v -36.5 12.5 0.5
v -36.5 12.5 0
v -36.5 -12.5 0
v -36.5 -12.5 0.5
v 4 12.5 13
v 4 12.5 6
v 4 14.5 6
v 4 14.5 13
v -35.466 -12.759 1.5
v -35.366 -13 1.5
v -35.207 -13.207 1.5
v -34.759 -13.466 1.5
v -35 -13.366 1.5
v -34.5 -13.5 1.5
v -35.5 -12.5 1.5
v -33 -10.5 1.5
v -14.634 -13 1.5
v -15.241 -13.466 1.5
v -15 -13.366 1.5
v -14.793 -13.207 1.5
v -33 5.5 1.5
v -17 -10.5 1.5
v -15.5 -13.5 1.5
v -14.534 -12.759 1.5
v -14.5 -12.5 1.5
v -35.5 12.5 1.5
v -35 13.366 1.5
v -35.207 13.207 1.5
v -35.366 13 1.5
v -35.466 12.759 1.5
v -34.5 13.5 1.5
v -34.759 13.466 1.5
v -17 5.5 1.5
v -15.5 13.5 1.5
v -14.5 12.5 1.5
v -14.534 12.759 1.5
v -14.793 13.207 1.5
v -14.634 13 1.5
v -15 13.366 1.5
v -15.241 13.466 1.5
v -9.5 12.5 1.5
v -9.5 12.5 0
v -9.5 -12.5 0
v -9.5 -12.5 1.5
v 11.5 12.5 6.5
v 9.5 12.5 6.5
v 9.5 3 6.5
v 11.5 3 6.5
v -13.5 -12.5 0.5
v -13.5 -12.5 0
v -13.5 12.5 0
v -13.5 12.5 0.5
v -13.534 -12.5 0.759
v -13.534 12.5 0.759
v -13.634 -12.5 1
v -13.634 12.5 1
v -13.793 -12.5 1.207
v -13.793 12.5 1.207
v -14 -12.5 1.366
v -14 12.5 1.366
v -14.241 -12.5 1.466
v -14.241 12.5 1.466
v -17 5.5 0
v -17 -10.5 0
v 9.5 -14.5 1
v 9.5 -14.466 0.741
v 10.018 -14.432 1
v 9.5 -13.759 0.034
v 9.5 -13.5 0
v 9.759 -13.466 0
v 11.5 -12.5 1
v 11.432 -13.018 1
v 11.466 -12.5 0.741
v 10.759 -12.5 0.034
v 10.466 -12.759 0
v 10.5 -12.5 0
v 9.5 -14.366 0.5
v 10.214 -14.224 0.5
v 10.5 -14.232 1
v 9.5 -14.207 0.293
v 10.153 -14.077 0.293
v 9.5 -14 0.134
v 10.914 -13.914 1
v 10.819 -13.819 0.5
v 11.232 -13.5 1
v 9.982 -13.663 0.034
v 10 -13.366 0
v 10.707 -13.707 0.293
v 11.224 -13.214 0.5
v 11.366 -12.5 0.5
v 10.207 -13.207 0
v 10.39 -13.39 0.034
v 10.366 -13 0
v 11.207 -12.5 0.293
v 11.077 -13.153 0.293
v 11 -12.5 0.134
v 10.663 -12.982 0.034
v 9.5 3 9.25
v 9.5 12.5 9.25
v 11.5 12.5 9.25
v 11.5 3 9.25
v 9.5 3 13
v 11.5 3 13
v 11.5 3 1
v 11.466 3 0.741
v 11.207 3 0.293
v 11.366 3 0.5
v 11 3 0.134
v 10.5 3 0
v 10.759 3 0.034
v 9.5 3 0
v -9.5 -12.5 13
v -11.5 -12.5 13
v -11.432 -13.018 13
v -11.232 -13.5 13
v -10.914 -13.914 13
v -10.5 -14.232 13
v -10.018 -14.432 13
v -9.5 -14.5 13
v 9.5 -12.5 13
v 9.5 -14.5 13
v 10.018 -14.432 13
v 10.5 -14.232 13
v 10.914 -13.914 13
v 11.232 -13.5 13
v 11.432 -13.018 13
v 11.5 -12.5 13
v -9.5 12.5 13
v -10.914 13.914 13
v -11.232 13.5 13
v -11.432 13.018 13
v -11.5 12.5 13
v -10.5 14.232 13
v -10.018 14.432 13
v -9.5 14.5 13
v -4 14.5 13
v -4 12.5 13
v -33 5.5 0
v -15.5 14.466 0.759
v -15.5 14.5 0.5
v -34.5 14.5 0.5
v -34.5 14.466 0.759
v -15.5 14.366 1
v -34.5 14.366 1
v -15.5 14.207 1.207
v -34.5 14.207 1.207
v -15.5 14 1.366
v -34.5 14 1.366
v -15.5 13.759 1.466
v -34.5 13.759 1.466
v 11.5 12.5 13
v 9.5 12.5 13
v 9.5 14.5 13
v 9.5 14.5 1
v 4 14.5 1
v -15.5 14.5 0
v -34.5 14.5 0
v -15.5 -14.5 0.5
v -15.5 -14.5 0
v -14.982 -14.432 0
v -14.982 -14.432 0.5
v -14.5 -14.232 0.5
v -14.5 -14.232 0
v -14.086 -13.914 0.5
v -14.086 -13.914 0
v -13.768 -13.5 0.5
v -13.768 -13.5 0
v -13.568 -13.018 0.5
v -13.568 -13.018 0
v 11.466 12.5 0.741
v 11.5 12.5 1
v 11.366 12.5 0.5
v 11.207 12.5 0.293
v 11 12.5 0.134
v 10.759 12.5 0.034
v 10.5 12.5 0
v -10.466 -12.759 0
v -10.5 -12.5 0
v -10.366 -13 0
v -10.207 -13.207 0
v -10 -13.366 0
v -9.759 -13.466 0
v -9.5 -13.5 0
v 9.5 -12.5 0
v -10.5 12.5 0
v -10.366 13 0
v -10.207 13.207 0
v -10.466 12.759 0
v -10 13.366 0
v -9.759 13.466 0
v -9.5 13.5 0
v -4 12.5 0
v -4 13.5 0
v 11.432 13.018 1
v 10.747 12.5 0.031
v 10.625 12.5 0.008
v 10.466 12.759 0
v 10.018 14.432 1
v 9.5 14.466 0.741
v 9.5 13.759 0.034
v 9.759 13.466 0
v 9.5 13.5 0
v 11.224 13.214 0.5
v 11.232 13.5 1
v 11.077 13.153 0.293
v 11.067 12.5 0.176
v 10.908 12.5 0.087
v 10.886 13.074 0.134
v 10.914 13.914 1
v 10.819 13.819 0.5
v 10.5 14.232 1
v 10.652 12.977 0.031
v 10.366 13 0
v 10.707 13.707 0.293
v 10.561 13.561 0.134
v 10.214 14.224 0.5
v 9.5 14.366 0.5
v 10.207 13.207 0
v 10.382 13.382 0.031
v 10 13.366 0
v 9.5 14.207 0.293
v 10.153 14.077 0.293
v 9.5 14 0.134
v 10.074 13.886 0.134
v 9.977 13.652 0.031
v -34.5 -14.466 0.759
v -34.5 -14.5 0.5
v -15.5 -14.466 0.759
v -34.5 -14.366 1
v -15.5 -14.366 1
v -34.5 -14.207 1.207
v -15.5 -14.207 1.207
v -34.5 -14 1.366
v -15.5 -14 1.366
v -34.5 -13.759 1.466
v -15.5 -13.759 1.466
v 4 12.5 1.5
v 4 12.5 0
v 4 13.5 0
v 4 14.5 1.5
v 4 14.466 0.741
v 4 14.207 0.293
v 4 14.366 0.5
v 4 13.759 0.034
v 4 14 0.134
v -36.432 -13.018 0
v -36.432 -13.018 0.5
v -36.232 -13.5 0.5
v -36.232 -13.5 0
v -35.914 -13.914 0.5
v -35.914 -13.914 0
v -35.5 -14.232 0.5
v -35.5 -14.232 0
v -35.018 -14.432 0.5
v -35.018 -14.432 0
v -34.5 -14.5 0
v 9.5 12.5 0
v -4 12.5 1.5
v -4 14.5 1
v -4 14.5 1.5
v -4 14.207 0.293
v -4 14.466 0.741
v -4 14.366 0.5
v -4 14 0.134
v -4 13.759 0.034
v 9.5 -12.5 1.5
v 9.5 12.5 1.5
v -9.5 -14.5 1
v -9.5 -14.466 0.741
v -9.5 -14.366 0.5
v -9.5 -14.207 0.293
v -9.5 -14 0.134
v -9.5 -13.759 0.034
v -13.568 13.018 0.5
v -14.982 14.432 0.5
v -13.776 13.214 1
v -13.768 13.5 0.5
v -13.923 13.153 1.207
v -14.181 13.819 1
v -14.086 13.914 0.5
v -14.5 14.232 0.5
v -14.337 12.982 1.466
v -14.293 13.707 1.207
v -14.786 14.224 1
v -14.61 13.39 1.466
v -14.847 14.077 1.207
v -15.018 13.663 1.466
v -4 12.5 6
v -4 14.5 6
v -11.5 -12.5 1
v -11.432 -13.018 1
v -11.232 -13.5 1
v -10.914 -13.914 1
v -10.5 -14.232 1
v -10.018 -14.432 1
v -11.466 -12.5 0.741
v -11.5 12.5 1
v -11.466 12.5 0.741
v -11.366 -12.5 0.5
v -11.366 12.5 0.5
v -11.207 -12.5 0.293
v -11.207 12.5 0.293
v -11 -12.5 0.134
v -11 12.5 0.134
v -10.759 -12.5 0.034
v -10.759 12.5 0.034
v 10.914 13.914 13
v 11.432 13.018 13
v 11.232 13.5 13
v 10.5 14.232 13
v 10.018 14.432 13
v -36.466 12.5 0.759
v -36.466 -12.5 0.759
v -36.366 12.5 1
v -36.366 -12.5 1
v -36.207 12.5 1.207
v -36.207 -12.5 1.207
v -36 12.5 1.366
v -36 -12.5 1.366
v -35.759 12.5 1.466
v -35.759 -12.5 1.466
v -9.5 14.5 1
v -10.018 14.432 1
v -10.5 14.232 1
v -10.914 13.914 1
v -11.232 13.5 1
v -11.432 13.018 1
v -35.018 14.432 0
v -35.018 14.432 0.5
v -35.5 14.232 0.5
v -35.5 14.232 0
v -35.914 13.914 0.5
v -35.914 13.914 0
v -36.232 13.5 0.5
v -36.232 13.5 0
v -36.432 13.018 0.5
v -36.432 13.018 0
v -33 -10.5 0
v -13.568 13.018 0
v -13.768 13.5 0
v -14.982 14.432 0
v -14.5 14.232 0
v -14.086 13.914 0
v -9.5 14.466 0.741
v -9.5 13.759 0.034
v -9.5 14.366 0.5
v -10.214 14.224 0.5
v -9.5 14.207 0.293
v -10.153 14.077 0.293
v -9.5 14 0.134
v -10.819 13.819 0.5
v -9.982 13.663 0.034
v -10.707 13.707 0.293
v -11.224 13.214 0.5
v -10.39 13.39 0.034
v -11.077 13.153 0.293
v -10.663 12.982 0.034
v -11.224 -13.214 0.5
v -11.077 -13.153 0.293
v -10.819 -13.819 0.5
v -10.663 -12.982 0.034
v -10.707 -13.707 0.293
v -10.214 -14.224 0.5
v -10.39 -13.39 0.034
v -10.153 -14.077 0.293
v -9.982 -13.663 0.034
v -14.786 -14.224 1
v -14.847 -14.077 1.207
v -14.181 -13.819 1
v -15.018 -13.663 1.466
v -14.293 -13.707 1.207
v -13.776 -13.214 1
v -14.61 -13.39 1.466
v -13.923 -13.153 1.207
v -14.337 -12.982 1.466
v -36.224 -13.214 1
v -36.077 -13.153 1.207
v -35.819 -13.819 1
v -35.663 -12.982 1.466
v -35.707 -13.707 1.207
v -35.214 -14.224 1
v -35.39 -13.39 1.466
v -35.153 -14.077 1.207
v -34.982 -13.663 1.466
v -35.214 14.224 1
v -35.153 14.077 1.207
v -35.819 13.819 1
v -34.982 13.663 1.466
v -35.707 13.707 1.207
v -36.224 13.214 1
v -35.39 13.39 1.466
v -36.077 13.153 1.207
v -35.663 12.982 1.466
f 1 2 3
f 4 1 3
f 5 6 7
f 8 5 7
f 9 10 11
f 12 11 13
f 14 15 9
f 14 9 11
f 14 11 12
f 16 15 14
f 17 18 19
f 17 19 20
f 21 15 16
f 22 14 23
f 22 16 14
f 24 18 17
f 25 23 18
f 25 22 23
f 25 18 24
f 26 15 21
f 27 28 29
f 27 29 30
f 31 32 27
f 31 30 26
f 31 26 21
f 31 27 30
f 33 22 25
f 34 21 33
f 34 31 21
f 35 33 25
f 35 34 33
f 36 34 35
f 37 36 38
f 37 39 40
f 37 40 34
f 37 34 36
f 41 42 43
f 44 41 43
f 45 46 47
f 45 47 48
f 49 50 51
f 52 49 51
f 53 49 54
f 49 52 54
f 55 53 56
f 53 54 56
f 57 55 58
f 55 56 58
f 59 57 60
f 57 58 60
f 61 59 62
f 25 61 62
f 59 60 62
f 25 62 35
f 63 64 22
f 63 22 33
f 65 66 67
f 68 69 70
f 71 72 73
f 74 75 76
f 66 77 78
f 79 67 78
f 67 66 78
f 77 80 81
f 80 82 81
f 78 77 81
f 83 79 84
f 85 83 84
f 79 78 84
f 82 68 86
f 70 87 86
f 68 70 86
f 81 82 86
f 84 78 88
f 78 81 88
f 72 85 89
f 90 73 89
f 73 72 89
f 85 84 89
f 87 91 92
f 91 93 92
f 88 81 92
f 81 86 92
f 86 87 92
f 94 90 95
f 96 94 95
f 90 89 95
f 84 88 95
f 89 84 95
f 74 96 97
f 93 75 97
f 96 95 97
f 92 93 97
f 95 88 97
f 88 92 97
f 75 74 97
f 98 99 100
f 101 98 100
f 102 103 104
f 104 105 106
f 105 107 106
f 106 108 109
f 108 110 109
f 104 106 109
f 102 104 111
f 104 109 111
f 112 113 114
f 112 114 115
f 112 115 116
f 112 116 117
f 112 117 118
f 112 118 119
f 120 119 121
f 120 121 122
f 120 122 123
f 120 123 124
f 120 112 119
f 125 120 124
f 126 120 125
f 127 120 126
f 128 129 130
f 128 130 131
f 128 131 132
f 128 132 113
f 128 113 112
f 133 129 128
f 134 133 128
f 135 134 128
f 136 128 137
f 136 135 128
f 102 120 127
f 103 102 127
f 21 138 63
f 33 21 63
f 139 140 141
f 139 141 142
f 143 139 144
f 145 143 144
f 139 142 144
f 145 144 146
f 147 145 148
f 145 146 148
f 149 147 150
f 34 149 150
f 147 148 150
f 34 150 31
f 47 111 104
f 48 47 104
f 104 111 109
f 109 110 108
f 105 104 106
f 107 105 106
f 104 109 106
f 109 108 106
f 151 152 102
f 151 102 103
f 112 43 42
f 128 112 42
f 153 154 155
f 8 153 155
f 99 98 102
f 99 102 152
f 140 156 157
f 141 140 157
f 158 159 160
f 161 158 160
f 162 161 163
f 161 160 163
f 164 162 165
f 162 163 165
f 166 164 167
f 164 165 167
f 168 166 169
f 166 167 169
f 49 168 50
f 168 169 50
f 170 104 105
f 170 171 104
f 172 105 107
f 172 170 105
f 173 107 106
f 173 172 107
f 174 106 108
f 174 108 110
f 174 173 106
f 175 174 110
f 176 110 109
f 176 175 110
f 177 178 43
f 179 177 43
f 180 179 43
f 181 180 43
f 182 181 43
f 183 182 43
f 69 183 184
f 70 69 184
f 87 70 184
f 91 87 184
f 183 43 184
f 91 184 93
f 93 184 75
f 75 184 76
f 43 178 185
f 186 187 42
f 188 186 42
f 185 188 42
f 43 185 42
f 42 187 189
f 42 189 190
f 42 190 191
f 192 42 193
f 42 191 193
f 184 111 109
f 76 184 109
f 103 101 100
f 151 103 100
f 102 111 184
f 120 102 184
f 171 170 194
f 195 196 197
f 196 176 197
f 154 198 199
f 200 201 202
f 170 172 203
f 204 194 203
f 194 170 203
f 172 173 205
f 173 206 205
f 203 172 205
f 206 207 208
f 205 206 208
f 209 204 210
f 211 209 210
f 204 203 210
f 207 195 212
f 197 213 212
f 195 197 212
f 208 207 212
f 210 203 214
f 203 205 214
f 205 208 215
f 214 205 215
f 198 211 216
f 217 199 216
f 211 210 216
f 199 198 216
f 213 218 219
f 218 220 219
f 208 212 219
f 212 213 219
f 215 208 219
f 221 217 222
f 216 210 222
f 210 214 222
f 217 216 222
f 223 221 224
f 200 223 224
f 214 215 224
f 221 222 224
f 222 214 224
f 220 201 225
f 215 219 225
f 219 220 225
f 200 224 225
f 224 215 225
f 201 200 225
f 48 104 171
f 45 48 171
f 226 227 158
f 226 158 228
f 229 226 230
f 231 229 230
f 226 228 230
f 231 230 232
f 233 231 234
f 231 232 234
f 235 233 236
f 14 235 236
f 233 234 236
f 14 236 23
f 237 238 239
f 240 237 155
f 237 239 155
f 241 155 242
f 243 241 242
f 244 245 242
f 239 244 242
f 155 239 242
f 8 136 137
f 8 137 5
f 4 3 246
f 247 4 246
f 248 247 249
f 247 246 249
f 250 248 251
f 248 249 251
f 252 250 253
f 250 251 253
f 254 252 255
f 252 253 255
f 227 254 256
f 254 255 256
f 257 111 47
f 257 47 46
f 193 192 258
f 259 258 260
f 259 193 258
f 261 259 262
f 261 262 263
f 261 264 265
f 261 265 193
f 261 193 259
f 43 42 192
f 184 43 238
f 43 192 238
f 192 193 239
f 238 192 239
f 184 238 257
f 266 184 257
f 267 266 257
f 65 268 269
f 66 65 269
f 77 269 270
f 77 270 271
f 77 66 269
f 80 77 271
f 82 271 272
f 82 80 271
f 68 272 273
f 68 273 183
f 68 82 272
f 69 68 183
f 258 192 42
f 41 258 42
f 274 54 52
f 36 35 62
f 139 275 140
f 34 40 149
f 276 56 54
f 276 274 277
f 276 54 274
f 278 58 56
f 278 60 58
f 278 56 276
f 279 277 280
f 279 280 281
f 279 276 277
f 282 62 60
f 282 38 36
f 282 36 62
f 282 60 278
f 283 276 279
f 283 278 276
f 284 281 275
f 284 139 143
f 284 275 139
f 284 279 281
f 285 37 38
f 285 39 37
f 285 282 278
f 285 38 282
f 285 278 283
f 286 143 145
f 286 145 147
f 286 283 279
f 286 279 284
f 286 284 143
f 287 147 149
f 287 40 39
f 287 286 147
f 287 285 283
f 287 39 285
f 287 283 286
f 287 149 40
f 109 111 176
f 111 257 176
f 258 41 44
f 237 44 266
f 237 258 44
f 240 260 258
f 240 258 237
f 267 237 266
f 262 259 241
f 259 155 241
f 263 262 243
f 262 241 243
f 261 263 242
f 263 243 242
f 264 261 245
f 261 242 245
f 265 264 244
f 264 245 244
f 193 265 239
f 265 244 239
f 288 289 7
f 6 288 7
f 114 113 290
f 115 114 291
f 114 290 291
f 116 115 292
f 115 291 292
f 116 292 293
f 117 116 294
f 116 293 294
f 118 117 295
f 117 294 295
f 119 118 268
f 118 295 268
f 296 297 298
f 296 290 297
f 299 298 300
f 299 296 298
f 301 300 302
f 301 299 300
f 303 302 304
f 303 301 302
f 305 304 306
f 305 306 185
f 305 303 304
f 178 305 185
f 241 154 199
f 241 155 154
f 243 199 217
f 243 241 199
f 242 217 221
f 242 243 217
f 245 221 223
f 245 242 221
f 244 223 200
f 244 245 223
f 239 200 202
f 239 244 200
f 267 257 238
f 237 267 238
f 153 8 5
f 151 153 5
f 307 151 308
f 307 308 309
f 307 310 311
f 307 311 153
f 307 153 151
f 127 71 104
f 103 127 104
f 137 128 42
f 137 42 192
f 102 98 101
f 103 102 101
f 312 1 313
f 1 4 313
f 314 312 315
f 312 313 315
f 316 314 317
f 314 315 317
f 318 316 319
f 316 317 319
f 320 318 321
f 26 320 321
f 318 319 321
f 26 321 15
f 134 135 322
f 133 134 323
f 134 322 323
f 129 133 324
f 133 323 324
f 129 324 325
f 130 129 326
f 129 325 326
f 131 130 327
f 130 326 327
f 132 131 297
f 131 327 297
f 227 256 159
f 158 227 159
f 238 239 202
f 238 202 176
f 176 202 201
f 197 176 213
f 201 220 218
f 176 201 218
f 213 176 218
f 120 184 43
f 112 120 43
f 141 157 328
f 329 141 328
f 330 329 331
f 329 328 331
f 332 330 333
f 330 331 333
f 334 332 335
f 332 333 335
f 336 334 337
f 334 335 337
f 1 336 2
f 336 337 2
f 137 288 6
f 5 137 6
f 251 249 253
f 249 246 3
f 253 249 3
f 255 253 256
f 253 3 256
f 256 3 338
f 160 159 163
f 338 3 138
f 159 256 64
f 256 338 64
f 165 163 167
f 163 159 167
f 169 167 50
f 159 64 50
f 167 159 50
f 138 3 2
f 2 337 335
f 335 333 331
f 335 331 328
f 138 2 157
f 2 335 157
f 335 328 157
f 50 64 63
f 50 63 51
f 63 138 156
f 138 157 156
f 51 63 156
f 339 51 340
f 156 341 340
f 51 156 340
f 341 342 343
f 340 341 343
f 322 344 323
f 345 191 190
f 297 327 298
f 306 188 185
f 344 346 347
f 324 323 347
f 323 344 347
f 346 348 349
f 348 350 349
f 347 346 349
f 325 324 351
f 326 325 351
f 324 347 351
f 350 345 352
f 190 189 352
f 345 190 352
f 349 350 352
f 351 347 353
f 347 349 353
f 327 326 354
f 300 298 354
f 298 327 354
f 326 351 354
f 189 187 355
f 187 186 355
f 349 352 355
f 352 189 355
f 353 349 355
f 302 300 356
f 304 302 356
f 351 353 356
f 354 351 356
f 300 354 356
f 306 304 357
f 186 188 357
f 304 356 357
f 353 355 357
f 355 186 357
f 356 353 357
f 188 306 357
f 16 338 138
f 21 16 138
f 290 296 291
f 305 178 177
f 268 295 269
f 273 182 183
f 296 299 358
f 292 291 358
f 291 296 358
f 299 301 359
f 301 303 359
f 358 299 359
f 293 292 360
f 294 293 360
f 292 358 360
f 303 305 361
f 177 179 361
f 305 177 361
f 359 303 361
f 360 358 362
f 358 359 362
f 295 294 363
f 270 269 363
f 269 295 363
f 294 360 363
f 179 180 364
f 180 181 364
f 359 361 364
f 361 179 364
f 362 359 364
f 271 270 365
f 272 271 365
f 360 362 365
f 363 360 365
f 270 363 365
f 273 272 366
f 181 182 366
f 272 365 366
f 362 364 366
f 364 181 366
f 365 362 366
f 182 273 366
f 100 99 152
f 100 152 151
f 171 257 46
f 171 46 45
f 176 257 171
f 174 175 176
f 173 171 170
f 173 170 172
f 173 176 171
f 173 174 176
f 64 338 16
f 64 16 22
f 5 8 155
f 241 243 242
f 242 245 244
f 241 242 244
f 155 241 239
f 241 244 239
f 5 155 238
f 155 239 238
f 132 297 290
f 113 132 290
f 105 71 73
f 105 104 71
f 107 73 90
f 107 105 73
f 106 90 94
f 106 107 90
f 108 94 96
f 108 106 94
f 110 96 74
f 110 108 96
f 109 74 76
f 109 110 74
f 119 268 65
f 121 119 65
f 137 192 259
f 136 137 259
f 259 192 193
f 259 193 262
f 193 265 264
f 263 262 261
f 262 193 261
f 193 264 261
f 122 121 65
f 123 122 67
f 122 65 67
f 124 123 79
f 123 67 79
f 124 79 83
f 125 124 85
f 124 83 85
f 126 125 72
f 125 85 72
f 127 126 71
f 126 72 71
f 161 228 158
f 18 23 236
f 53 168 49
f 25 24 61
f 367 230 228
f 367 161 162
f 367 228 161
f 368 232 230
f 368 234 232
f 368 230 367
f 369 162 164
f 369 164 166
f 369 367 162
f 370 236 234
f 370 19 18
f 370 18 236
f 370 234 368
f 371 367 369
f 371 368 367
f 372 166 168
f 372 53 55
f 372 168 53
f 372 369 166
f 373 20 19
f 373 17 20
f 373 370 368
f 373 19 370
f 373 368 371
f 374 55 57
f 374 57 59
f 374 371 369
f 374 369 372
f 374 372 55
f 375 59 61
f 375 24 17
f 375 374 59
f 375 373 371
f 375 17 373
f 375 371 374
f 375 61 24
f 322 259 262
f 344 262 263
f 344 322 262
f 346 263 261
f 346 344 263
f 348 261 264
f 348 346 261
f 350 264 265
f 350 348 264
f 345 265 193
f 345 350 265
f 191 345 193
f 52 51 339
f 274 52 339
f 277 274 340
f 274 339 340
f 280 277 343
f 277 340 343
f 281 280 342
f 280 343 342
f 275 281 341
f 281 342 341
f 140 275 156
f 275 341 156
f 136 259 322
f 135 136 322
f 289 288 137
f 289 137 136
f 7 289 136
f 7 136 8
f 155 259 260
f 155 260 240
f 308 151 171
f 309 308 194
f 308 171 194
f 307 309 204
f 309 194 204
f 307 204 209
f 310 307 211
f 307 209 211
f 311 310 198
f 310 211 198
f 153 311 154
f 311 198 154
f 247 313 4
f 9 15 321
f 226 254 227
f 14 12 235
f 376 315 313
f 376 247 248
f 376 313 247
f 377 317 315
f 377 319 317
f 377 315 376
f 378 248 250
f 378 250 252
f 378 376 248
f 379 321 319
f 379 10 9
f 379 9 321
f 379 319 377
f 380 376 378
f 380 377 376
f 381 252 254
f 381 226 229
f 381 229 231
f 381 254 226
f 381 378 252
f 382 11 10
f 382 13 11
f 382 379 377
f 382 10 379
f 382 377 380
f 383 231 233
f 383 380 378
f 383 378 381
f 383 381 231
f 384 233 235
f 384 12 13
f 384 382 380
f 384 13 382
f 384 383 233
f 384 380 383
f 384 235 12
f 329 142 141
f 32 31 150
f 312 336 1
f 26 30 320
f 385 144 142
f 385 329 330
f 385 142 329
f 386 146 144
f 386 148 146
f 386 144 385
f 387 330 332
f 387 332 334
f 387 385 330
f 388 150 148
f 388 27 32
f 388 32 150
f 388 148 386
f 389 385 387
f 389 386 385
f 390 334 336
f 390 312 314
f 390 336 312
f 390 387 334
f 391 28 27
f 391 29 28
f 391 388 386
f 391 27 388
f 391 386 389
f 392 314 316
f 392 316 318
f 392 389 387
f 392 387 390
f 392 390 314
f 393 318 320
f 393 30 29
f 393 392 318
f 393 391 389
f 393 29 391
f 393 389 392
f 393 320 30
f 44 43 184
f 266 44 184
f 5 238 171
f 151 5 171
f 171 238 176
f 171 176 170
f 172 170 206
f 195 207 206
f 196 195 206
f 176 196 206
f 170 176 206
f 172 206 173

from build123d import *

# Parameters (mm, degrees)
F0_W      = 2
F0_H      = 9.5
F0_W_2    = 15
F0_H_2    = 2
F2_DEPTH  = 13
F3_W      = 8
F3_H      = 2
F4_DEPTH  = 1.5
F5_W      = 2
F5_H      = 9.5
F6_DEPTH  = 6.5
F8_START  = 6
F7_W      = 8
F7_H      = 2
F8_DEPTH  = 7
F10_START = 9.25
F9_W      = 2
F9_H      = 9.5
F10_DEPTH = 3.75
F11_R     = 1
F11_2_R   = 1
F11_3_R   = 1
F11_4_R   = 1
F1_W      = 8
F1_H      = 2
F1_W_2    = 2
F1_H_2    = 9.5
F1_W_3    = 15
F1_W_4    = 16
F1_H_3    = 16
F12_DEPTH = 1.5
F13_R     = 1


with BuildPart() as f2:
    # F0 (on Top) → F2 (new body)
    with BuildSketch(Plane.XY):
        with BuildLine():
            Line((-9.5, 12.5), (-4, 12.5))
            Line((-4, 12.5), (-4, 14.5))
            Line((-4, 14.5), (-9.5, 14.5))
            ThreePointArc((-9.5, 14.5), (-10.9142135624, 13.9142135624), (-11.5, 12.5))
            Line((-11.5, 12.5), (-9.5, 12.5))
        make_face()
        with Locations((-10.5, 7.75)):
            Rectangle(F0_W, F0_H)
        with BuildLine():
            Line((-7.5, -14.5), (-7.5, -12.5))
            Line((-7.5, -12.5), (-9.5, -12.5))
            Line((-9.5, -12.5), (-9.5, 3))
            Line((-9.5, 3), (-11.5, 3))
            Line((-11.5, 3), (-11.5, -12.5))
            ThreePointArc((-11.5, -12.5), (-10.9142135624, -13.9142135624), (-9.5, -14.5))
            Line((-9.5, -14.5), (-7.5, -14.5))
        make_face()
        with Locations((0, -13.5)):
            Rectangle(F0_W_2, F0_H_2)
        with BuildLine():
            Line((9.5, 3), (9.5, -12.5))
            Line((9.5, -12.5), (7.5, -12.5))
            Line((7.5, -12.5), (7.5, -14.5))
            Line((7.5, -14.5), (9.5, -14.5))
            ThreePointArc((9.5, -14.5), (10.9142135624, -13.9142135624), (11.5, -12.5))
            Line((11.5, -12.5), (11.5, 3))
            Line((11.5, 3), (9.5, 3))
        make_face()
    extrude(amount=F2_DEPTH)

    # F11
    f11_edges = [f2.edges().sort_by_distance(p)[0] for p in [
        (0, -14.5, 0),
    ]]
    fillet(f11_edges, radius=F11_R)


with BuildPart() as f2b:
    # F0 (on Top) → F2, piece 2 (new body)
    with BuildSketch(Plane.XY):
        with BuildLine():
            Line((4, 12.5), (9.5, 12.5))
            Line((9.5, 12.5), (11.5, 12.5))
            ThreePointArc((11.5, 12.5), (10.9142135624, 13.9142135624), (9.5, 14.5))
            Line((9.5, 14.5), (4, 14.5))
            Line((4, 14.5), (4, 12.5))
        make_face()
    extrude(amount=F2_DEPTH)

    # F11#2
    f11_2_edges = [f2b.edges().sort_by_distance(p)[0] for p in [
        (6.75, 14.5, 0),
    ]]
    fillet(f11_2_edges, radius=F11_2_R)


with BuildPart() as f4:
    # F3 (on Top) → F4 (new body)
    with BuildSketch(Plane.XY):
        Polygon((7.5, -12.5), (9.5, -12.5), (9.5, 12.5), (4, 12.5), (-4, 12.5), (-9.5, 12.5), (-9.5, 3), (-9.5, -12.5), (-7.5, -12.5), align=None)
        with Locations((0, 13.5)):
            Rectangle(F3_W, F3_H)
    extrude(amount=F4_DEPTH)

    # F11#4
    f11_4_edges = [f4.edges().sort_by_distance(p)[0] for p in [
        (0, 14.5, 0),
    ]]
    fillet(f11_4_edges, radius=F11_4_R)


with BuildPart() as f6:
    # F5 (on Top) → F6 (new body)
    with BuildSketch(Plane.XY):
        with Locations((10.5, 7.75)):
            Rectangle(F5_W, F5_H)
    extrude(amount=F6_DEPTH)

    # F11#3
    f11_3_edges = [f6.edges().sort_by_distance(p)[0] for p in [
        (11.5, 7.75, 0),
    ]]
    fillet(f11_3_edges, radius=F11_3_R)


with BuildPart() as f8:
    # F7 (on Top) → F8 (new body)
    with BuildSketch(Plane.XY.offset(F8_START)):
        with Locations((0, 13.5)):
            Rectangle(F7_W, F7_H)
    extrude(amount=F8_DEPTH)


with BuildPart() as f10:
    # F9 (on Top) → F10 (new body)
    with BuildSketch(Plane.XY.offset(F10_START)):
        with Locations((10.5, 7.75)):
            Rectangle(F9_W, F9_H)
    extrude(amount=F10_DEPTH)


with BuildPart() as f12:
    # F1 (on Top) → F12 (new body)
    with BuildSketch(Plane.XY):
        with Locations((-25, 13.5)):
            Rectangle(F1_W, F1_H)
        with BuildLine():
            Line((-34.5, 12.5), (-29, 12.5))
            Line((-29, 12.5), (-29, 14.5))
            Line((-29, 14.5), (-34.5, 14.5))
            ThreePointArc((-34.5, 14.5), (-35.9142135624, 13.9142135624), (-36.5, 12.5))
            Line((-36.5, 12.5), (-34.5, 12.5))
        make_face()
        with Locations((-35.5, 7.75)):
            Rectangle(F1_W_2, F1_H_2)
        with BuildLine():
            Line((-32.5, -14.5), (-32.5, -12.5))
            Line((-32.5, -12.5), (-34.5, -12.5))
            Line((-34.5, -12.5), (-34.5, 3))
            Line((-34.5, 3), (-36.5, 3))
            Line((-36.5, 3), (-36.5, -12.5))
            ThreePointArc((-36.5, -12.5), (-35.9142135624, -13.9142135624), (-34.5, -14.5))
            Line((-34.5, -14.5), (-32.5, -14.5))
        make_face()
        with Locations((-25, -13.5)):
            Rectangle(F1_W_3, F1_H)
        with BuildLine():
            Line((-15.5, 3), (-15.5, -12.5))
            Line((-15.5, -12.5), (-17.5, -12.5))
            Line((-17.5, -12.5), (-17.5, -14.5))
            Line((-17.5, -14.5), (-15.5, -14.5))
            ThreePointArc((-15.5, -14.5), (-14.0857864376, -13.9142135624), (-13.5, -12.5))
            Line((-13.5, -12.5), (-13.5, 3))
            Line((-13.5, 3), (-15.5, 3))
        make_face()
        with Locations((-14.5, 7.75)):
            Rectangle(F1_W_2, F1_H_2)
        with BuildLine():
            Line((-21, 12.5), (-15.5, 12.5))
            Line((-15.5, 12.5), (-13.5, 12.5))
            ThreePointArc((-13.5, 12.5), (-14.0857864376, 13.9142135624), (-15.5, 14.5))
            Line((-15.5, 14.5), (-21, 14.5))
            Line((-21, 14.5), (-21, 12.5))
        make_face()
        Polygon((-17.5, -12.5), (-15.5, -12.5), (-15.5, 3), (-15.5, 12.5), (-21, 12.5), (-29, 12.5), (-34.5, 12.5), (-34.5, 3), (-34.5, -12.5), (-32.5, -12.5), align=None)
        with Locations((-25, -2.5)):
            Rectangle(F1_W_4, F1_H_3, mode=Mode.SUBTRACT)
    extrude(amount=F12_DEPTH)

    # F13
    f13_edges = [f12.edges().sort_by_distance(p)[0] for p in [
        (-36.5, 0, 1.5),
    ]]
    fillet(f13_edges, radius=F13_R)


solid = Compound([f2.part, f2b.part, f4.part, f6.part, f8.part, f10.part, f12.part])
